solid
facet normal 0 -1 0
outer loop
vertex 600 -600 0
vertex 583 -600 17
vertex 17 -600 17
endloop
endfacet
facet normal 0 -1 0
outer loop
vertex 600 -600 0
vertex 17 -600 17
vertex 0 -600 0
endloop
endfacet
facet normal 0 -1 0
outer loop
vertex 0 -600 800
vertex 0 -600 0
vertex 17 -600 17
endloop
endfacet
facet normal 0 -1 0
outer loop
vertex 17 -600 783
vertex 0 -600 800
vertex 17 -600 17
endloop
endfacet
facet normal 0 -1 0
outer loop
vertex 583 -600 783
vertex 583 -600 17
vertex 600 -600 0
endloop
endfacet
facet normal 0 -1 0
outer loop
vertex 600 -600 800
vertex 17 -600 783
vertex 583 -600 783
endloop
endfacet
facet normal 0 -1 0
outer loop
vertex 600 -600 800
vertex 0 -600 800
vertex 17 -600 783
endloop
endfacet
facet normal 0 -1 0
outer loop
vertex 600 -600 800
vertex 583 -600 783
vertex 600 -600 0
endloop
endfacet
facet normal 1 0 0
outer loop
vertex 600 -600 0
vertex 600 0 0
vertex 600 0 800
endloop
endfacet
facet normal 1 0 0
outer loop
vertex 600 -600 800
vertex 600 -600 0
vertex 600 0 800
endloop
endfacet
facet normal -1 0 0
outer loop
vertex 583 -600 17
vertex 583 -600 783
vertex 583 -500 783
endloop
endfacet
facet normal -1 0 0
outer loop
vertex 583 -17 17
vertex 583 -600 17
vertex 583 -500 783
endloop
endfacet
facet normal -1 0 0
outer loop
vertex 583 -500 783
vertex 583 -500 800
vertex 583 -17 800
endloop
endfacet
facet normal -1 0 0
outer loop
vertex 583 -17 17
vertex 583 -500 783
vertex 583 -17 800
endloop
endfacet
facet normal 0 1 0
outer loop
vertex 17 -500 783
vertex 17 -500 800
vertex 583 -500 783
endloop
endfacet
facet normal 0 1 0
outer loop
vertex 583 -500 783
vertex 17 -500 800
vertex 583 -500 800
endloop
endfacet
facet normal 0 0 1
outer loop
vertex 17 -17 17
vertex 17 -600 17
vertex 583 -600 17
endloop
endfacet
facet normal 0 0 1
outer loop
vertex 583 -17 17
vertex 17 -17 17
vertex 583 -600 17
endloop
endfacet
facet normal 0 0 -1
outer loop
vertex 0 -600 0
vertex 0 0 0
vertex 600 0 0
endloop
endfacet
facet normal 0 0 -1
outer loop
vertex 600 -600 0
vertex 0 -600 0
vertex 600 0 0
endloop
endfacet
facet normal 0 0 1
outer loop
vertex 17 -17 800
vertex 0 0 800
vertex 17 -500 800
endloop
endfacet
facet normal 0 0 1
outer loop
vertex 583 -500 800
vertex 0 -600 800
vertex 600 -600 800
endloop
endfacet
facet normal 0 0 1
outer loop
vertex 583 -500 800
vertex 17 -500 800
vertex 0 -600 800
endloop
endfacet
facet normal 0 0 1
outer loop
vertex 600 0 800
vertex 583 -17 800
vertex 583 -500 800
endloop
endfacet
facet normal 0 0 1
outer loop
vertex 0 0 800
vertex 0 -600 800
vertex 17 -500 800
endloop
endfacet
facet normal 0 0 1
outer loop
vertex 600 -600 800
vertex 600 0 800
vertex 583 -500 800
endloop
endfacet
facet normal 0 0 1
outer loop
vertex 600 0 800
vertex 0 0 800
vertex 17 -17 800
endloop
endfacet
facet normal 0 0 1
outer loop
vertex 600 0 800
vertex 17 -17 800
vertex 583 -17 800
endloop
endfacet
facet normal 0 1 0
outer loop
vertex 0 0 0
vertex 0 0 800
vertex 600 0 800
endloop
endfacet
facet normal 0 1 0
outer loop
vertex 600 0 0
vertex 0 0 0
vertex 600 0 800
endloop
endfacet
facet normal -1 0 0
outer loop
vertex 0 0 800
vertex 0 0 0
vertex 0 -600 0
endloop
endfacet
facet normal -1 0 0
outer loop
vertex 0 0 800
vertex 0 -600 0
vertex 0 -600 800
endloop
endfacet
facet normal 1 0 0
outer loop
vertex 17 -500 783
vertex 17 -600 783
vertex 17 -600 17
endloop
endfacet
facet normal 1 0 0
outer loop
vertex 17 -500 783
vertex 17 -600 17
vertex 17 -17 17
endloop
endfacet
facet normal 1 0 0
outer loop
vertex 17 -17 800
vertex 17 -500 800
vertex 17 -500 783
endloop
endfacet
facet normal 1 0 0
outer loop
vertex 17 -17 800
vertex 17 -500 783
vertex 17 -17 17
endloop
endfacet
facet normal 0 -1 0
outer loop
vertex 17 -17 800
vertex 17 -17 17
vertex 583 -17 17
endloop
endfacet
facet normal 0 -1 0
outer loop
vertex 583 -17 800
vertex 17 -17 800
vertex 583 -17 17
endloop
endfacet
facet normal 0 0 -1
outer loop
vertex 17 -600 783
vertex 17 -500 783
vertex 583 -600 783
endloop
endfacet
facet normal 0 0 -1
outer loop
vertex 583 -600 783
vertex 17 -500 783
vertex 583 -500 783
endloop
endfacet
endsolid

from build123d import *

# Parameters (mm, degrees)
F0_W     = 600
F0_H     = 800
F1_DEPTH = 600
F2_T     = -17
F4_W     = 566
F4_H     = 483
F5_DEPTH = 17


with BuildPart() as f1:
    # F0 (on Front) → F1 (new body)
    with BuildSketch(Plane.XZ):
        with Locations((300, 400)):
            Rectangle(F0_W, F0_H)
    extrude(amount=F1_DEPTH)

    # F2
    f2_openings = [f1.faces().sort_by_distance(p)[0] for p in [
        (300, -600, 400),
    ]]
    offset(amount=F2_T, openings=f2_openings)

    # F4 (on face) → F5 (cut, through all)
    with BuildSketch(Plane.XY.offset(800)):
        with Locations((300, -258.5)):
            Rectangle(F4_W, F4_H)
    extrude(amount=-F5_DEPTH, mode=Mode.SUBTRACT)


solid = f1.part
